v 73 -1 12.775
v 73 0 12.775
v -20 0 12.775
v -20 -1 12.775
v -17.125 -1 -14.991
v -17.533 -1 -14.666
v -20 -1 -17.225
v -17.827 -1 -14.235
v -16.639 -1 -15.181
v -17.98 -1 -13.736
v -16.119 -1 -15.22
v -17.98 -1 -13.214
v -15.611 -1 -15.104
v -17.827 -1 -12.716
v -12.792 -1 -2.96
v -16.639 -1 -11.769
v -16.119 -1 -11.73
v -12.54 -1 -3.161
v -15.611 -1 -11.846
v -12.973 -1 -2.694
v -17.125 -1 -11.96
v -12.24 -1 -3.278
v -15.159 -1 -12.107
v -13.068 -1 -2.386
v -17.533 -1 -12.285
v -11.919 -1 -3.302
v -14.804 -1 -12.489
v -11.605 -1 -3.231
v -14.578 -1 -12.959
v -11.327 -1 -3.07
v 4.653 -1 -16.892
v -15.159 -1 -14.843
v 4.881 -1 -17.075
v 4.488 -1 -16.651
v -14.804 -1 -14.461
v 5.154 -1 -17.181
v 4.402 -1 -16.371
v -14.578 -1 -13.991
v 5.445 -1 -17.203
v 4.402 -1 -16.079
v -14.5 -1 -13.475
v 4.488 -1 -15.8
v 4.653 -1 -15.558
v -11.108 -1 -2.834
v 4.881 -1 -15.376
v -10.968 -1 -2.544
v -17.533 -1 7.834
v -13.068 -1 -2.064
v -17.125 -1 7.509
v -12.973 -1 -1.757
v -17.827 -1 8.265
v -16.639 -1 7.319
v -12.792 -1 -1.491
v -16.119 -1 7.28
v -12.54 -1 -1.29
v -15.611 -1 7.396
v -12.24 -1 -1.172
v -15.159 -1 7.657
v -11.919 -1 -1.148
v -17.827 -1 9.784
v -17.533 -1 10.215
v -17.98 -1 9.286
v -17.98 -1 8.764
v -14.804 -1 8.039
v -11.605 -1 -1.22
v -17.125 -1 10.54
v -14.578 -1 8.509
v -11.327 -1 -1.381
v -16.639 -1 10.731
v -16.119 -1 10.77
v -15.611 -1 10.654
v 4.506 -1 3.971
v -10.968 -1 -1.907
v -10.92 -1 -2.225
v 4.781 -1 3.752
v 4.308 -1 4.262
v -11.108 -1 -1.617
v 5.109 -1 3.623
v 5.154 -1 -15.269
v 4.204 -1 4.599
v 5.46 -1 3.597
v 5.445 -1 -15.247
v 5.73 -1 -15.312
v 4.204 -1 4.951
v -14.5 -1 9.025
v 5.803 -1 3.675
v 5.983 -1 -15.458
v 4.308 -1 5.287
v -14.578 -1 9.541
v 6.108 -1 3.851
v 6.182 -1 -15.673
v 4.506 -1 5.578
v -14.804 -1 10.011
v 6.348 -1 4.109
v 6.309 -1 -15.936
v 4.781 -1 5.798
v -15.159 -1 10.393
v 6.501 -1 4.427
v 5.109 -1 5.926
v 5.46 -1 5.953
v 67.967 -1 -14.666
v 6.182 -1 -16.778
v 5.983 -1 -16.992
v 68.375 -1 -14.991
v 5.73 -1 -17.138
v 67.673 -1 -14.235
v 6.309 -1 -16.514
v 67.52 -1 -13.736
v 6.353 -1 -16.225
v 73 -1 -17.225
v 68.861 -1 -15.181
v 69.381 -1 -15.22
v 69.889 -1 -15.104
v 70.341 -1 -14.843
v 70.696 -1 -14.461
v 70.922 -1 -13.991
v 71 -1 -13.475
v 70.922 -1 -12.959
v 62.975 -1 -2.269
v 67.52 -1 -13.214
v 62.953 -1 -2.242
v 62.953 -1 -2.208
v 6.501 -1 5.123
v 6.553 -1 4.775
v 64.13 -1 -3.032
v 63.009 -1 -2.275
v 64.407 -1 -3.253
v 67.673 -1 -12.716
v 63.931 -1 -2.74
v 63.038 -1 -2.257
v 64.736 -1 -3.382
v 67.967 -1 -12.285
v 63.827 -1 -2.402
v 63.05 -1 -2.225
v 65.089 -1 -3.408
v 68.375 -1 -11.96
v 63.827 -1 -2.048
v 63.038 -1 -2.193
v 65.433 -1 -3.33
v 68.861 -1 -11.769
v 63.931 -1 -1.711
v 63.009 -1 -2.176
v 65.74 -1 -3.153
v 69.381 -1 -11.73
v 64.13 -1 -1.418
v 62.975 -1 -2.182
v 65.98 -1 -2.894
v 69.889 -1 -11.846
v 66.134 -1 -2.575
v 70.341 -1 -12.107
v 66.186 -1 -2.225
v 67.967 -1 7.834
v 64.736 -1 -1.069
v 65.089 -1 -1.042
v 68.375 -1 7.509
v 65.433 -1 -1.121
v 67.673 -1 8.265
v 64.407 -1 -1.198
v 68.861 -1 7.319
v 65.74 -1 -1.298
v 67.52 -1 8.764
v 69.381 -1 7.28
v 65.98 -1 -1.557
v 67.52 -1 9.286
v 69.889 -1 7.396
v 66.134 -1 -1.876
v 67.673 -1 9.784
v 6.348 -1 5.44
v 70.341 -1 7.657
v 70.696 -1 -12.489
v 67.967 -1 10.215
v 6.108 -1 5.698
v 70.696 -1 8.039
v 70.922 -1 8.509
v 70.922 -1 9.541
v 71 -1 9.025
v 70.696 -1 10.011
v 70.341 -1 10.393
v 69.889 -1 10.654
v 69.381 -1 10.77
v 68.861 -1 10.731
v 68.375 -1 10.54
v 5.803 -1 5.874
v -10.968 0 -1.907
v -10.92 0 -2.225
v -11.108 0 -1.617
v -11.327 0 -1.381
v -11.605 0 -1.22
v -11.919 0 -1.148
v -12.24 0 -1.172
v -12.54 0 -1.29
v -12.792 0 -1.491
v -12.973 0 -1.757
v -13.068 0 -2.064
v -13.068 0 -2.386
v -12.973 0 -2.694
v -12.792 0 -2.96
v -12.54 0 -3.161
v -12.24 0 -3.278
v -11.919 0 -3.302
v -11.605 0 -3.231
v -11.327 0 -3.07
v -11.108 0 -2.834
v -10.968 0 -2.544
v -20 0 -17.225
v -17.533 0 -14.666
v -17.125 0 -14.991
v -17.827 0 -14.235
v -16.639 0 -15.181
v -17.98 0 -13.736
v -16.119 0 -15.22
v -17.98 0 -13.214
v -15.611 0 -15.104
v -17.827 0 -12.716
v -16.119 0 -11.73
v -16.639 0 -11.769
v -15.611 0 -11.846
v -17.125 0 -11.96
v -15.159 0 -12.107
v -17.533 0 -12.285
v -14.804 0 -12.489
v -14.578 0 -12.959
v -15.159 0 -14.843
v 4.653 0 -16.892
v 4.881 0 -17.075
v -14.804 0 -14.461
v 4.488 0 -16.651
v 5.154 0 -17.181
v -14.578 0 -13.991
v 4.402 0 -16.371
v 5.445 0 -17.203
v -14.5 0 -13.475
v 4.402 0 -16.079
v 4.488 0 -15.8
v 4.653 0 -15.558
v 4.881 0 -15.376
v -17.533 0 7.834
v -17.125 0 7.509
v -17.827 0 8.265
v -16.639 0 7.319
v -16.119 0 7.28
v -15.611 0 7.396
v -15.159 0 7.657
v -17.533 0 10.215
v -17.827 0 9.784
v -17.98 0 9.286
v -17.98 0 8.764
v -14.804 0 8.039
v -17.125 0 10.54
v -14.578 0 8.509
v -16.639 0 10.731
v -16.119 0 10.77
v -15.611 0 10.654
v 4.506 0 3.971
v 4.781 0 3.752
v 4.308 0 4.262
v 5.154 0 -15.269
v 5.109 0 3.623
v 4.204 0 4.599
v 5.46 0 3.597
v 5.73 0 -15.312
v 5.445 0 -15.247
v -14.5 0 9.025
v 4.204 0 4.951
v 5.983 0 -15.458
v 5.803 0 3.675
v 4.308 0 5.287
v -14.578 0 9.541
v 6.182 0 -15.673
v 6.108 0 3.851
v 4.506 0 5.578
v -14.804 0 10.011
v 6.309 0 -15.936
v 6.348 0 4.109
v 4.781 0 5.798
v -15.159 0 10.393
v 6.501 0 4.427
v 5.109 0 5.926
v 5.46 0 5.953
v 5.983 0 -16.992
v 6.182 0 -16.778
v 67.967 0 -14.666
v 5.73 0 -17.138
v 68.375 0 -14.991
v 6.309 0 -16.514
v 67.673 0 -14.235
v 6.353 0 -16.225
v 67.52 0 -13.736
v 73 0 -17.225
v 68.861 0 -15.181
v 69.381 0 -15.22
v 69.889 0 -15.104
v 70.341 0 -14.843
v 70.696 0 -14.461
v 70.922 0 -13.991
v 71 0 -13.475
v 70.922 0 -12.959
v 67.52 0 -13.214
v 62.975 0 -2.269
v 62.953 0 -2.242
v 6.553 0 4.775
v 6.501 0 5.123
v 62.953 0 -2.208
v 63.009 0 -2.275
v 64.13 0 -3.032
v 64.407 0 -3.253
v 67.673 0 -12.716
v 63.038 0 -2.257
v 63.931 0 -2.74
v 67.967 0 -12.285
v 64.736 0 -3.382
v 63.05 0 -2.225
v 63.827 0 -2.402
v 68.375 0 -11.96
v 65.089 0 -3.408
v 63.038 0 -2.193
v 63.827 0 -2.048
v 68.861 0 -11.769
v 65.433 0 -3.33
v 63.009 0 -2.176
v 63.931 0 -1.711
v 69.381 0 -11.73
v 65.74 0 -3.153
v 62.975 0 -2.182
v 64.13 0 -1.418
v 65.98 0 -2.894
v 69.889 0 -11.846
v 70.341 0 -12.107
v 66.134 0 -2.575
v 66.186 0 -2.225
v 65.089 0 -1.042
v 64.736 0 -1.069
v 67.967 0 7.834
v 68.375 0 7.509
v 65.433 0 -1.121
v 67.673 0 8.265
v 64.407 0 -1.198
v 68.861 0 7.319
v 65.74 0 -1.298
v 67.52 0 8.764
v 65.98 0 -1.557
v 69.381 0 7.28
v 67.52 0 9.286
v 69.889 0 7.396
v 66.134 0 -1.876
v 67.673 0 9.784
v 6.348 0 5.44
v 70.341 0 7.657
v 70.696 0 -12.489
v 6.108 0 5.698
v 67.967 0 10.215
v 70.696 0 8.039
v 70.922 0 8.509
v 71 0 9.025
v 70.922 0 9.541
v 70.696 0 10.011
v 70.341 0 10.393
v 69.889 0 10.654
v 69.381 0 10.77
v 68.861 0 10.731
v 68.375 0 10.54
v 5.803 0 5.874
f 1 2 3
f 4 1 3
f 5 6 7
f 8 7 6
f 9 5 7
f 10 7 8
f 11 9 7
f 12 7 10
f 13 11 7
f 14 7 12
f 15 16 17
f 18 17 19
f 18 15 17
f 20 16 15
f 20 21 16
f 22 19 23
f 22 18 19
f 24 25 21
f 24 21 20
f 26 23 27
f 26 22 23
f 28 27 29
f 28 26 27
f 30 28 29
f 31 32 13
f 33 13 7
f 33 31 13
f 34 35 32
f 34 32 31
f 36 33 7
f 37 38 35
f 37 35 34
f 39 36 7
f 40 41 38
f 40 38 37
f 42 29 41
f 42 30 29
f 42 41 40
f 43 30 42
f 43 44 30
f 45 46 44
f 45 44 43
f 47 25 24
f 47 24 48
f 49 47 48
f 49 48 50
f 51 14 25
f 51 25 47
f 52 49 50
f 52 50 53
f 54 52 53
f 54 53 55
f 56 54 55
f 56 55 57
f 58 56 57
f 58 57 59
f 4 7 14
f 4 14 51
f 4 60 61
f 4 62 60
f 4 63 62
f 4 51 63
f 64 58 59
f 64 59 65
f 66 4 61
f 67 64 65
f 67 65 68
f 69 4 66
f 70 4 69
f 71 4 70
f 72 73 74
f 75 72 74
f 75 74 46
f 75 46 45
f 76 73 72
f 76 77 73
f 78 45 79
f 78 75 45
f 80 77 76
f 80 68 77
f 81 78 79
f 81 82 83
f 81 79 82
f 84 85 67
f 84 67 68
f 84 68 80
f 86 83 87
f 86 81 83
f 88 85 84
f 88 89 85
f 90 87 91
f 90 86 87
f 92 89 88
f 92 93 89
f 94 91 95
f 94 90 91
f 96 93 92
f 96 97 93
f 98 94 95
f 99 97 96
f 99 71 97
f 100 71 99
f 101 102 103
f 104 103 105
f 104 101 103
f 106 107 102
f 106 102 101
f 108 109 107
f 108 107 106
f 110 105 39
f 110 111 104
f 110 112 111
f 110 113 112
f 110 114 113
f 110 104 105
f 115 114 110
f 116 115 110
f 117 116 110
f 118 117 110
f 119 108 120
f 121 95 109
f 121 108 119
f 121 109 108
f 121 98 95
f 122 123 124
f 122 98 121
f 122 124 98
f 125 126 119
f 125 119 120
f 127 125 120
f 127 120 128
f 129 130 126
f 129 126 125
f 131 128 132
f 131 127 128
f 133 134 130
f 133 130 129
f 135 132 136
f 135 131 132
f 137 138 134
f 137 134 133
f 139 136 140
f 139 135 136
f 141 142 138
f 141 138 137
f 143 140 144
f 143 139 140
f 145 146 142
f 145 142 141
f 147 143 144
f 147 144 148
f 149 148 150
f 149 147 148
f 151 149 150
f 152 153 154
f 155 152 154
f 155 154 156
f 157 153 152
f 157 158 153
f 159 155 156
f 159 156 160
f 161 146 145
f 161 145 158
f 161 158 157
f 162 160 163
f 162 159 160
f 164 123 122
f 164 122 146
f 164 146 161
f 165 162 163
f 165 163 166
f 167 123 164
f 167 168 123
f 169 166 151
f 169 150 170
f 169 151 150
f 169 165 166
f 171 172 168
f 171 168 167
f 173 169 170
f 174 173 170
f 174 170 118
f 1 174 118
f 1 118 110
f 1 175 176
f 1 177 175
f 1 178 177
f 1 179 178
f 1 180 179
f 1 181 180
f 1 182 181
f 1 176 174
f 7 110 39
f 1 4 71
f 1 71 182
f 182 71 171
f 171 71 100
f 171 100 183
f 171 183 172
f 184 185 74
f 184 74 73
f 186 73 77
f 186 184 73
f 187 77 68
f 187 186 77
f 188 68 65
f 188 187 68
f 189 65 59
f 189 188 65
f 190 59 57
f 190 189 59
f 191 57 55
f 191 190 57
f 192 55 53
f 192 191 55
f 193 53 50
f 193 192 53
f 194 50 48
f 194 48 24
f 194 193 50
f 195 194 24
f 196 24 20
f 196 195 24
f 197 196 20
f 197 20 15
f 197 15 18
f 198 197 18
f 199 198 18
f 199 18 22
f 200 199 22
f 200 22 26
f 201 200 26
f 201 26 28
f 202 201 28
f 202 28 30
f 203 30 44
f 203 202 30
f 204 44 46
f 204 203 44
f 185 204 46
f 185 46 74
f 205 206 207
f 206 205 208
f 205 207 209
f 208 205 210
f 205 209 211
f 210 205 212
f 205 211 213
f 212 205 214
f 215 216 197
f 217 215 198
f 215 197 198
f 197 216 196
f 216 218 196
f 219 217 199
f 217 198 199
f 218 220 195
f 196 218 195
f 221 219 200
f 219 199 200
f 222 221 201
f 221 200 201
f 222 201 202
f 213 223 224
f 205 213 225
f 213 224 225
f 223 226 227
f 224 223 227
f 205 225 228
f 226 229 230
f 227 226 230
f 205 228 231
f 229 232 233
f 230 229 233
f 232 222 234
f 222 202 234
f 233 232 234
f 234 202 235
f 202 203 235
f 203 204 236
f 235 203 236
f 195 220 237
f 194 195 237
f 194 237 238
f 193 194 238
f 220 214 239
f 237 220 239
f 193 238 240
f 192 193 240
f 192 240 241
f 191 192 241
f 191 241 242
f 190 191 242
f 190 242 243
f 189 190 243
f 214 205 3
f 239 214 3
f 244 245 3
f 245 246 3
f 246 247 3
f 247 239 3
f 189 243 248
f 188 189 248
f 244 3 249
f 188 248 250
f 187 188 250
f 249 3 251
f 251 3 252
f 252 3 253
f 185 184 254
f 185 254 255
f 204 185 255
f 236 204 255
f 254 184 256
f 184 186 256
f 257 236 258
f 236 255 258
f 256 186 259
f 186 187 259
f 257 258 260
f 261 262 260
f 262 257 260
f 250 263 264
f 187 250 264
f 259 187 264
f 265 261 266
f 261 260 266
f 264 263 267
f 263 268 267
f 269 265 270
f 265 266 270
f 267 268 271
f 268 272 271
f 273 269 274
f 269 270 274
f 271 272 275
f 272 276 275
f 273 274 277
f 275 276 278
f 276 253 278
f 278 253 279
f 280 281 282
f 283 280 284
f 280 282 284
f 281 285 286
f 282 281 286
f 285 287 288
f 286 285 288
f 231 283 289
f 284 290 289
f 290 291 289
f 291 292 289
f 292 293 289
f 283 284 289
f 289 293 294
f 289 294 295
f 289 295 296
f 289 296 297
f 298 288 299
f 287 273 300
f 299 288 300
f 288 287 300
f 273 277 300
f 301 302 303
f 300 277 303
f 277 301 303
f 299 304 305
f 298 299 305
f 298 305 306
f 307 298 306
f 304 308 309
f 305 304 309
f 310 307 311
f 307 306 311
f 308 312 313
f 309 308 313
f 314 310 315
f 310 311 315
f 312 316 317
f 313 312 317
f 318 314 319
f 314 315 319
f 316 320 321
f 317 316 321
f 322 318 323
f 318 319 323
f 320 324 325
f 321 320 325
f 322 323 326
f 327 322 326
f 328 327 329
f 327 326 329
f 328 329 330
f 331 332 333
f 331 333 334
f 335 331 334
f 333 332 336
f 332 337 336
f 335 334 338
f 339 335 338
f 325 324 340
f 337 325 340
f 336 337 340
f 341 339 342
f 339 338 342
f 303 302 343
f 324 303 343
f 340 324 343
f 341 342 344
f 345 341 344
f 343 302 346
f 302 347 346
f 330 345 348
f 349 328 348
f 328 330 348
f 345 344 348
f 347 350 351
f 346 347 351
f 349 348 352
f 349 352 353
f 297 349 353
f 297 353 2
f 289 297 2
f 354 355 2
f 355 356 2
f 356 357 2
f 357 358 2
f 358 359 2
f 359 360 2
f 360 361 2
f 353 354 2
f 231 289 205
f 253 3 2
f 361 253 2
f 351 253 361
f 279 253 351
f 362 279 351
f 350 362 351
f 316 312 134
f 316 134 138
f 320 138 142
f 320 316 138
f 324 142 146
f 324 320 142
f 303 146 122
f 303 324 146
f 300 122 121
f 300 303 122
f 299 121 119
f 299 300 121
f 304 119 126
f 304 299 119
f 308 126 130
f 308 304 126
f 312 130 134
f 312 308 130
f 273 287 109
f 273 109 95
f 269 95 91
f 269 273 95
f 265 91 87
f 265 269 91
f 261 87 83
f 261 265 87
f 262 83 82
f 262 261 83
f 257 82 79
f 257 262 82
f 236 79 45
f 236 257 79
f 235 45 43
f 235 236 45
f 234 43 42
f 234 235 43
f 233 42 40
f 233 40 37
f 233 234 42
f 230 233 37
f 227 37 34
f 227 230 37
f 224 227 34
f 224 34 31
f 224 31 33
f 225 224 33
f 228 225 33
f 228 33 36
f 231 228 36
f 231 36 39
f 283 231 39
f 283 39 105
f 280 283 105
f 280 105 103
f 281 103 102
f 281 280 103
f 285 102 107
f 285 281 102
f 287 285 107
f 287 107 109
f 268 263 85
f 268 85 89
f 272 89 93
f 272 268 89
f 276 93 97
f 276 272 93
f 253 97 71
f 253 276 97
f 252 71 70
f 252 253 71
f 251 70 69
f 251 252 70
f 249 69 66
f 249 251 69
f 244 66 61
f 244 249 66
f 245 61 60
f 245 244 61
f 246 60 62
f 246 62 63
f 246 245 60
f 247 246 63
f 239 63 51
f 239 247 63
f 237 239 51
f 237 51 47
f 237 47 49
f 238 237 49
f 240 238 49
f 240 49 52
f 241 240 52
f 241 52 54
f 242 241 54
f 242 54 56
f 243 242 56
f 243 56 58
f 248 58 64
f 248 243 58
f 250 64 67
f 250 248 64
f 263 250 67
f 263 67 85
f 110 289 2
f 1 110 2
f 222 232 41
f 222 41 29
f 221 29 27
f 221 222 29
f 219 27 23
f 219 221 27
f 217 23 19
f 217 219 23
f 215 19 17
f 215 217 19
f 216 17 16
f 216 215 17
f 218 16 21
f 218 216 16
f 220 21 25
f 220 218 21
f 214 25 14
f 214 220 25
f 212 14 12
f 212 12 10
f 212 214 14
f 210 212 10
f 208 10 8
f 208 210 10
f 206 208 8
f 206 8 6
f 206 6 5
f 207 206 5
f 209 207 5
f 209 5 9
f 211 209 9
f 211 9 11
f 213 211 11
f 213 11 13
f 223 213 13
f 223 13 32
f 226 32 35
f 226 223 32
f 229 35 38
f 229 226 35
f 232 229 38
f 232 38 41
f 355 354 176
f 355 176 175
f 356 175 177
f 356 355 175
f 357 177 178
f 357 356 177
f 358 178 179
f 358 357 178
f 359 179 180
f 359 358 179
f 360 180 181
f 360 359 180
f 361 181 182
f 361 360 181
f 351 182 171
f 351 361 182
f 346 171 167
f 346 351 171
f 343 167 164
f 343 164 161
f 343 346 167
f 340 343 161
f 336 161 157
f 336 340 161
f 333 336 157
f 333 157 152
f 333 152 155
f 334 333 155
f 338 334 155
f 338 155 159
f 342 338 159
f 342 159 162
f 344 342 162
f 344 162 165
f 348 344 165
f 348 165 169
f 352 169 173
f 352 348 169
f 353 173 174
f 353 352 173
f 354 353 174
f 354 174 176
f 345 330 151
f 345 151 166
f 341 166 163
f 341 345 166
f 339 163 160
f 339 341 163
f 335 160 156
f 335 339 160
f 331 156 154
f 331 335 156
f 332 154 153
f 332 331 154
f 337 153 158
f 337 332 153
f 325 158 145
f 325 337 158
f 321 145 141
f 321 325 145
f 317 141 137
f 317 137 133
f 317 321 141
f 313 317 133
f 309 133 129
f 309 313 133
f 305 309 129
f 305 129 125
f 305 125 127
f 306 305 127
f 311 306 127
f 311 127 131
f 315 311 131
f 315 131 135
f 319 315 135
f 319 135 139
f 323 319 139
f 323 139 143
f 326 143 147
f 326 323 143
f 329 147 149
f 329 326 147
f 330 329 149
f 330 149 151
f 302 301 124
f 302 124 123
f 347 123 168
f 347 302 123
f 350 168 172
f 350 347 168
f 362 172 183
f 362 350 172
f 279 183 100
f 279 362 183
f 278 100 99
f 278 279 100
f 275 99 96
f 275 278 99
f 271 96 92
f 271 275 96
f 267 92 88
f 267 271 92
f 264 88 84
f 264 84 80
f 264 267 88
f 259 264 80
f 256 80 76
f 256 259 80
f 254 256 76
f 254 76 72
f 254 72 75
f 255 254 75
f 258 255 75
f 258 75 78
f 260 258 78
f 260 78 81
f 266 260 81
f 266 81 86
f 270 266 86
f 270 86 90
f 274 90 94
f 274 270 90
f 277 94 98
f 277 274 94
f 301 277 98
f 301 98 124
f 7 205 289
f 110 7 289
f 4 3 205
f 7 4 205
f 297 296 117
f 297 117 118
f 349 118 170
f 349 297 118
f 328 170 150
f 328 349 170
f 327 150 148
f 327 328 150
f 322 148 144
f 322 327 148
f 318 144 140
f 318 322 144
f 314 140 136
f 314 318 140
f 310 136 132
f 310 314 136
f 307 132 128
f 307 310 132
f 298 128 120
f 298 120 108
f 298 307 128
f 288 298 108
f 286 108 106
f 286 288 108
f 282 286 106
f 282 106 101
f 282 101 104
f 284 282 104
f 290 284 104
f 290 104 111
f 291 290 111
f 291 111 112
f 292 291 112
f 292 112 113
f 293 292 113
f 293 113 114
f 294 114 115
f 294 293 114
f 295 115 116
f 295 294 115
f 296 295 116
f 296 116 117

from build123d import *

# Parameters (mm, degrees)
F0_W     = 20
F0_H     = 12.774734
F0_R     = 1.75
F0_R_2   = 1.181266
F0_H_2   = 17.225266
F0_R_3   = 1.079972
F0_R_4   = 0.05
F0_R_5   = 1.186285
F0_R_6   = 0.980798
F1_DEPTH = 1


with BuildPart() as f1:
    # F0 (on Front) → F1 (new body)
    with BuildSketch(Plane.XZ):
        with Locations((-10, 6.387367)):
            Rectangle(F0_W, F0_H)
        with Locations((-16.25, 9.024734)):
            Circle(F0_R, mode=Mode.SUBTRACT)
        with Locations((10, 6.387367)):
            Rectangle(F0_W, F0_H)
        with Locations((5.371809, 4.774734)):
            Circle(F0_R_2, mode=Mode.SUBTRACT)
        with Locations((-10, -8.612633)):
            Rectangle(F0_W, F0_H_2)
        with Locations((-16.25, -13.475266)):
            Circle(F0_R, mode=Mode.SUBTRACT)
        with Locations((-12, -2.225266)):
            Circle(F0_R_3, mode=Mode.SUBTRACT)
        Polygon((73, 12.774734), (20, 12.774734), (20, 0), (20, -17.225266), (73, -17.225266), align=None)
        with Locations((69.25, -13.475266)):
            Circle(F0_R, mode=Mode.SUBTRACT)
        with Locations((63, -2.225266)):
            Circle(F0_R_4, mode=Mode.SUBTRACT)
        with Locations((65, -2.225266)):
            Circle(F0_R_5, mode=Mode.SUBTRACT)
        with Locations((69.25, 9.024734)):
            Circle(F0_R, mode=Mode.SUBTRACT)
        with Locations((10, -8.612633)):
            Rectangle(F0_W, F0_H_2)
        with Locations((5.371809, -16.225266)):
            Circle(F0_R_6, mode=Mode.SUBTRACT)
    extrude(amount=F1_DEPTH)


solid = f1.part
